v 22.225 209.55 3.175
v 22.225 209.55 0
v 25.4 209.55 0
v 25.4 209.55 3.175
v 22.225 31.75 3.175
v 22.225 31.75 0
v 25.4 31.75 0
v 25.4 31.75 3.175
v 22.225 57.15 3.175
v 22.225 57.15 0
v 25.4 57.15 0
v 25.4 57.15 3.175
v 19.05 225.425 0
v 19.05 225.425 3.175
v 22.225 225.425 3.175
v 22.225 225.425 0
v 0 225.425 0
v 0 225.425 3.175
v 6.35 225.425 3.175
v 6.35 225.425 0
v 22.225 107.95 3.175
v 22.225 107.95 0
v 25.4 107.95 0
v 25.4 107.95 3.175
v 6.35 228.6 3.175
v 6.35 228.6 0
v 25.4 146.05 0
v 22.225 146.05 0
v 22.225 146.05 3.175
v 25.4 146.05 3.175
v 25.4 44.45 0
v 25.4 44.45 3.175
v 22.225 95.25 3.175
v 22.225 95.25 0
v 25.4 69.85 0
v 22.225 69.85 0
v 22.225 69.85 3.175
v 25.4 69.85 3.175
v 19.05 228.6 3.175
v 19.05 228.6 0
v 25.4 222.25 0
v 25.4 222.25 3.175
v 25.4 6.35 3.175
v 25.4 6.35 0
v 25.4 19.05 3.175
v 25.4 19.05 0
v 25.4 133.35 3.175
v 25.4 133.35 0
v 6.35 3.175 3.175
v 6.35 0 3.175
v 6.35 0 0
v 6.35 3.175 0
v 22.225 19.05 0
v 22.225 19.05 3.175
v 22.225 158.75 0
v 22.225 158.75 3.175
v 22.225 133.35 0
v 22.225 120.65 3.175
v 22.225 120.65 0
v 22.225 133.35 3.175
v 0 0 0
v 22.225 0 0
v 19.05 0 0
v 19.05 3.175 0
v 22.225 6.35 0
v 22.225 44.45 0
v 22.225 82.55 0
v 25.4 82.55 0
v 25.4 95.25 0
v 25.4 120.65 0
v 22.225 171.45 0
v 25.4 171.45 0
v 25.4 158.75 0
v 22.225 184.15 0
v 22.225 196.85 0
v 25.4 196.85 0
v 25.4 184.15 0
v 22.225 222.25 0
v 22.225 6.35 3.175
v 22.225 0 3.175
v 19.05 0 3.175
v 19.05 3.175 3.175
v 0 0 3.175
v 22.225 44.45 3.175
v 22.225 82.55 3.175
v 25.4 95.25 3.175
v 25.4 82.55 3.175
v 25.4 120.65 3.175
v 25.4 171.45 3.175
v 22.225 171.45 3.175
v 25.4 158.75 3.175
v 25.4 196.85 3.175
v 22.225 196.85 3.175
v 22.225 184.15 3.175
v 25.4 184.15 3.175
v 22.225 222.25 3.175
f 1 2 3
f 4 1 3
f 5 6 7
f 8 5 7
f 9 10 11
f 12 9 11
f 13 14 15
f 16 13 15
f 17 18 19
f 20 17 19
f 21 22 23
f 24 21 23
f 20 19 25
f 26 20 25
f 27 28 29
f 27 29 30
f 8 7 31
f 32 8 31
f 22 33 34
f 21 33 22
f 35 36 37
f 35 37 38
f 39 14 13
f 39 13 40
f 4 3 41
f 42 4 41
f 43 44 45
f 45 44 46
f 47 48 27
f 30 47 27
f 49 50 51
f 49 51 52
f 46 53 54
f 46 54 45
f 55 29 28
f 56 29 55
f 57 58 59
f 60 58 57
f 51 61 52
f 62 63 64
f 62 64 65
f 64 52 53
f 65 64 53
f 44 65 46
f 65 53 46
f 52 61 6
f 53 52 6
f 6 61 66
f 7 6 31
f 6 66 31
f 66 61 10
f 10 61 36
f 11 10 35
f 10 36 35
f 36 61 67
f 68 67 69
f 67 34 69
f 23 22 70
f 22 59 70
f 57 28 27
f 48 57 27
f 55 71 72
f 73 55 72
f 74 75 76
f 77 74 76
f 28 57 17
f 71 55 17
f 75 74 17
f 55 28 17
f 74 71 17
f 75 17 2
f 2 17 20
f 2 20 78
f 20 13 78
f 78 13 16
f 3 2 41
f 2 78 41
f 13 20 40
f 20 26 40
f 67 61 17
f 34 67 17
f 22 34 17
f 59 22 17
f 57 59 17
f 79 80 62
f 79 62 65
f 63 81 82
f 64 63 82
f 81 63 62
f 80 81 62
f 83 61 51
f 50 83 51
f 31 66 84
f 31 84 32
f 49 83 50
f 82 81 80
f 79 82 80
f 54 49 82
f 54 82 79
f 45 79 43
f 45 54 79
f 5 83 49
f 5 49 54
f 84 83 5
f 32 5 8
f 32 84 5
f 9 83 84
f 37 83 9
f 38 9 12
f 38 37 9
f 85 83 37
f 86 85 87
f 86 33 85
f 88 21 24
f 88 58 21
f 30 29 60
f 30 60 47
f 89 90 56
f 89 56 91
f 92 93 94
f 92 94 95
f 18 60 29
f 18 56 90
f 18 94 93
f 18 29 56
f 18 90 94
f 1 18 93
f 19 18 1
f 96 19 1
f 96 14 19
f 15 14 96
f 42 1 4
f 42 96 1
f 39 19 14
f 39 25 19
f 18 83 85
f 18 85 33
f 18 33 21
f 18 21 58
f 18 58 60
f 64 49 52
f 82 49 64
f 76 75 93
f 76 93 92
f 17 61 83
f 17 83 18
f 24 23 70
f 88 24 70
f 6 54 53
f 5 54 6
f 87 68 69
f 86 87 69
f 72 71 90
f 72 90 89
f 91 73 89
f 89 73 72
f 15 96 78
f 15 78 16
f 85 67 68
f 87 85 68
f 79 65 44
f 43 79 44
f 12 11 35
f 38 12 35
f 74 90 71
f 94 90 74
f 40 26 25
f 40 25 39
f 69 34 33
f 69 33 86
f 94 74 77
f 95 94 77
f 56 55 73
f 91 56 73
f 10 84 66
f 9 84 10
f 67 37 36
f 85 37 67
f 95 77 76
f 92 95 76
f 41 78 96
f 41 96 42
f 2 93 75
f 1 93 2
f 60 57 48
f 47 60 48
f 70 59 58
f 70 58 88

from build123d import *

# Parameters (mm, degrees)
SKETCH1_W          = 25.4
SKETCH1_H          = 228.6
EXTRUDE1_DEPTH     = 3.175
SKETCH3_W          = 3.175
SKETCH3_H          = 6.35
CUT_EXTRUDE1_DEPTH = 3.175
LPATTERN1_COUNT    = 2
LPATTERN1_PITCH    = 222.25
SKETCH4_W          = 3.175
SKETCH4_H          = 12.7
CUT_EXTRUDE2_DEPTH = 3.175
LPATTERN2_COUNT    = 8
LPATTERN2_PITCH    = 25.4
SKETCH5_W          = 12.7
SKETCH5_H          = 3.175
CUT_EXTRUDE3_DEPTH = 3.175
SKETCH6_W          = 6.35
SKETCH6_H          = 3.175
CUT_EXTRUDE4_DEPTH = 3.175
LPATTERN3_COUNT    = 2
LPATTERN3_PITCH    = 19.05


with BuildPart() as part:
    # Sketch1 → Extrude1 (new body)
    with BuildSketch(Plane.XY):
        with Locations((12.7, 114.3)):
            Rectangle(SKETCH1_W, SKETCH1_H)
    extrude(amount=EXTRUDE1_DEPTH)

    # Sketch3 → Cut-Extrude1 (cut)
    with BuildSketch(Plane.XY.offset(3.175)):
        with Locations((23.8125, 225.425)):
            Rectangle(SKETCH3_W, SKETCH3_H)
    cut_extrude1 = extrude(amount=-CUT_EXTRUDE1_DEPTH, mode=Mode.SUBTRACT)

    # LPattern1: Cut-Extrude1 ×2
    with Locations(*[(0, -i * LPATTERN1_PITCH, 0) for i in range(1, LPATTERN1_COUNT)]):
        add(cut_extrude1, mode=Mode.SUBTRACT)

    # Sketch4 → Cut-Extrude2 (cut)
    with BuildSketch(Plane.XY.offset(3.175)):
        with Locations((23.8125, 203.2)):
            Rectangle(SKETCH4_W, SKETCH4_H)
    cut_extrude2 = extrude(amount=-CUT_EXTRUDE2_DEPTH, mode=Mode.SUBTRACT)

    # LPattern2: Cut-Extrude2 ×8
    with Locations(*[(0, -i * LPATTERN2_PITCH, 0) for i in range(1, LPATTERN2_COUNT)]):
        add(cut_extrude2, mode=Mode.SUBTRACT)

    # Sketch5 → Cut-Extrude3 (cut)
    with BuildSketch(Plane.XY.offset(3.175)):
        with Locations((12.7, 1.5875)):
            Rectangle(SKETCH5_W, SKETCH5_H)
    extrude(amount=-CUT_EXTRUDE3_DEPTH, mode=Mode.SUBTRACT)

    # Sketch6 → Cut-Extrude4 (cut)
    with BuildSketch(Plane.XY.offset(3.175)):
        with Locations((3.175, 227.0125)):
            Rectangle(SKETCH6_W, SKETCH6_H)
    cut_extrude4 = extrude(amount=-CUT_EXTRUDE4_DEPTH, mode=Mode.SUBTRACT)

    # LPattern3: Cut-Extrude4 ×2
    with Locations(*[(i * LPATTERN3_PITCH, 0, 0) for i in range(1, LPATTERN3_COUNT)]):
        add(cut_extrude4, mode=Mode.SUBTRACT)


solid = part.part
